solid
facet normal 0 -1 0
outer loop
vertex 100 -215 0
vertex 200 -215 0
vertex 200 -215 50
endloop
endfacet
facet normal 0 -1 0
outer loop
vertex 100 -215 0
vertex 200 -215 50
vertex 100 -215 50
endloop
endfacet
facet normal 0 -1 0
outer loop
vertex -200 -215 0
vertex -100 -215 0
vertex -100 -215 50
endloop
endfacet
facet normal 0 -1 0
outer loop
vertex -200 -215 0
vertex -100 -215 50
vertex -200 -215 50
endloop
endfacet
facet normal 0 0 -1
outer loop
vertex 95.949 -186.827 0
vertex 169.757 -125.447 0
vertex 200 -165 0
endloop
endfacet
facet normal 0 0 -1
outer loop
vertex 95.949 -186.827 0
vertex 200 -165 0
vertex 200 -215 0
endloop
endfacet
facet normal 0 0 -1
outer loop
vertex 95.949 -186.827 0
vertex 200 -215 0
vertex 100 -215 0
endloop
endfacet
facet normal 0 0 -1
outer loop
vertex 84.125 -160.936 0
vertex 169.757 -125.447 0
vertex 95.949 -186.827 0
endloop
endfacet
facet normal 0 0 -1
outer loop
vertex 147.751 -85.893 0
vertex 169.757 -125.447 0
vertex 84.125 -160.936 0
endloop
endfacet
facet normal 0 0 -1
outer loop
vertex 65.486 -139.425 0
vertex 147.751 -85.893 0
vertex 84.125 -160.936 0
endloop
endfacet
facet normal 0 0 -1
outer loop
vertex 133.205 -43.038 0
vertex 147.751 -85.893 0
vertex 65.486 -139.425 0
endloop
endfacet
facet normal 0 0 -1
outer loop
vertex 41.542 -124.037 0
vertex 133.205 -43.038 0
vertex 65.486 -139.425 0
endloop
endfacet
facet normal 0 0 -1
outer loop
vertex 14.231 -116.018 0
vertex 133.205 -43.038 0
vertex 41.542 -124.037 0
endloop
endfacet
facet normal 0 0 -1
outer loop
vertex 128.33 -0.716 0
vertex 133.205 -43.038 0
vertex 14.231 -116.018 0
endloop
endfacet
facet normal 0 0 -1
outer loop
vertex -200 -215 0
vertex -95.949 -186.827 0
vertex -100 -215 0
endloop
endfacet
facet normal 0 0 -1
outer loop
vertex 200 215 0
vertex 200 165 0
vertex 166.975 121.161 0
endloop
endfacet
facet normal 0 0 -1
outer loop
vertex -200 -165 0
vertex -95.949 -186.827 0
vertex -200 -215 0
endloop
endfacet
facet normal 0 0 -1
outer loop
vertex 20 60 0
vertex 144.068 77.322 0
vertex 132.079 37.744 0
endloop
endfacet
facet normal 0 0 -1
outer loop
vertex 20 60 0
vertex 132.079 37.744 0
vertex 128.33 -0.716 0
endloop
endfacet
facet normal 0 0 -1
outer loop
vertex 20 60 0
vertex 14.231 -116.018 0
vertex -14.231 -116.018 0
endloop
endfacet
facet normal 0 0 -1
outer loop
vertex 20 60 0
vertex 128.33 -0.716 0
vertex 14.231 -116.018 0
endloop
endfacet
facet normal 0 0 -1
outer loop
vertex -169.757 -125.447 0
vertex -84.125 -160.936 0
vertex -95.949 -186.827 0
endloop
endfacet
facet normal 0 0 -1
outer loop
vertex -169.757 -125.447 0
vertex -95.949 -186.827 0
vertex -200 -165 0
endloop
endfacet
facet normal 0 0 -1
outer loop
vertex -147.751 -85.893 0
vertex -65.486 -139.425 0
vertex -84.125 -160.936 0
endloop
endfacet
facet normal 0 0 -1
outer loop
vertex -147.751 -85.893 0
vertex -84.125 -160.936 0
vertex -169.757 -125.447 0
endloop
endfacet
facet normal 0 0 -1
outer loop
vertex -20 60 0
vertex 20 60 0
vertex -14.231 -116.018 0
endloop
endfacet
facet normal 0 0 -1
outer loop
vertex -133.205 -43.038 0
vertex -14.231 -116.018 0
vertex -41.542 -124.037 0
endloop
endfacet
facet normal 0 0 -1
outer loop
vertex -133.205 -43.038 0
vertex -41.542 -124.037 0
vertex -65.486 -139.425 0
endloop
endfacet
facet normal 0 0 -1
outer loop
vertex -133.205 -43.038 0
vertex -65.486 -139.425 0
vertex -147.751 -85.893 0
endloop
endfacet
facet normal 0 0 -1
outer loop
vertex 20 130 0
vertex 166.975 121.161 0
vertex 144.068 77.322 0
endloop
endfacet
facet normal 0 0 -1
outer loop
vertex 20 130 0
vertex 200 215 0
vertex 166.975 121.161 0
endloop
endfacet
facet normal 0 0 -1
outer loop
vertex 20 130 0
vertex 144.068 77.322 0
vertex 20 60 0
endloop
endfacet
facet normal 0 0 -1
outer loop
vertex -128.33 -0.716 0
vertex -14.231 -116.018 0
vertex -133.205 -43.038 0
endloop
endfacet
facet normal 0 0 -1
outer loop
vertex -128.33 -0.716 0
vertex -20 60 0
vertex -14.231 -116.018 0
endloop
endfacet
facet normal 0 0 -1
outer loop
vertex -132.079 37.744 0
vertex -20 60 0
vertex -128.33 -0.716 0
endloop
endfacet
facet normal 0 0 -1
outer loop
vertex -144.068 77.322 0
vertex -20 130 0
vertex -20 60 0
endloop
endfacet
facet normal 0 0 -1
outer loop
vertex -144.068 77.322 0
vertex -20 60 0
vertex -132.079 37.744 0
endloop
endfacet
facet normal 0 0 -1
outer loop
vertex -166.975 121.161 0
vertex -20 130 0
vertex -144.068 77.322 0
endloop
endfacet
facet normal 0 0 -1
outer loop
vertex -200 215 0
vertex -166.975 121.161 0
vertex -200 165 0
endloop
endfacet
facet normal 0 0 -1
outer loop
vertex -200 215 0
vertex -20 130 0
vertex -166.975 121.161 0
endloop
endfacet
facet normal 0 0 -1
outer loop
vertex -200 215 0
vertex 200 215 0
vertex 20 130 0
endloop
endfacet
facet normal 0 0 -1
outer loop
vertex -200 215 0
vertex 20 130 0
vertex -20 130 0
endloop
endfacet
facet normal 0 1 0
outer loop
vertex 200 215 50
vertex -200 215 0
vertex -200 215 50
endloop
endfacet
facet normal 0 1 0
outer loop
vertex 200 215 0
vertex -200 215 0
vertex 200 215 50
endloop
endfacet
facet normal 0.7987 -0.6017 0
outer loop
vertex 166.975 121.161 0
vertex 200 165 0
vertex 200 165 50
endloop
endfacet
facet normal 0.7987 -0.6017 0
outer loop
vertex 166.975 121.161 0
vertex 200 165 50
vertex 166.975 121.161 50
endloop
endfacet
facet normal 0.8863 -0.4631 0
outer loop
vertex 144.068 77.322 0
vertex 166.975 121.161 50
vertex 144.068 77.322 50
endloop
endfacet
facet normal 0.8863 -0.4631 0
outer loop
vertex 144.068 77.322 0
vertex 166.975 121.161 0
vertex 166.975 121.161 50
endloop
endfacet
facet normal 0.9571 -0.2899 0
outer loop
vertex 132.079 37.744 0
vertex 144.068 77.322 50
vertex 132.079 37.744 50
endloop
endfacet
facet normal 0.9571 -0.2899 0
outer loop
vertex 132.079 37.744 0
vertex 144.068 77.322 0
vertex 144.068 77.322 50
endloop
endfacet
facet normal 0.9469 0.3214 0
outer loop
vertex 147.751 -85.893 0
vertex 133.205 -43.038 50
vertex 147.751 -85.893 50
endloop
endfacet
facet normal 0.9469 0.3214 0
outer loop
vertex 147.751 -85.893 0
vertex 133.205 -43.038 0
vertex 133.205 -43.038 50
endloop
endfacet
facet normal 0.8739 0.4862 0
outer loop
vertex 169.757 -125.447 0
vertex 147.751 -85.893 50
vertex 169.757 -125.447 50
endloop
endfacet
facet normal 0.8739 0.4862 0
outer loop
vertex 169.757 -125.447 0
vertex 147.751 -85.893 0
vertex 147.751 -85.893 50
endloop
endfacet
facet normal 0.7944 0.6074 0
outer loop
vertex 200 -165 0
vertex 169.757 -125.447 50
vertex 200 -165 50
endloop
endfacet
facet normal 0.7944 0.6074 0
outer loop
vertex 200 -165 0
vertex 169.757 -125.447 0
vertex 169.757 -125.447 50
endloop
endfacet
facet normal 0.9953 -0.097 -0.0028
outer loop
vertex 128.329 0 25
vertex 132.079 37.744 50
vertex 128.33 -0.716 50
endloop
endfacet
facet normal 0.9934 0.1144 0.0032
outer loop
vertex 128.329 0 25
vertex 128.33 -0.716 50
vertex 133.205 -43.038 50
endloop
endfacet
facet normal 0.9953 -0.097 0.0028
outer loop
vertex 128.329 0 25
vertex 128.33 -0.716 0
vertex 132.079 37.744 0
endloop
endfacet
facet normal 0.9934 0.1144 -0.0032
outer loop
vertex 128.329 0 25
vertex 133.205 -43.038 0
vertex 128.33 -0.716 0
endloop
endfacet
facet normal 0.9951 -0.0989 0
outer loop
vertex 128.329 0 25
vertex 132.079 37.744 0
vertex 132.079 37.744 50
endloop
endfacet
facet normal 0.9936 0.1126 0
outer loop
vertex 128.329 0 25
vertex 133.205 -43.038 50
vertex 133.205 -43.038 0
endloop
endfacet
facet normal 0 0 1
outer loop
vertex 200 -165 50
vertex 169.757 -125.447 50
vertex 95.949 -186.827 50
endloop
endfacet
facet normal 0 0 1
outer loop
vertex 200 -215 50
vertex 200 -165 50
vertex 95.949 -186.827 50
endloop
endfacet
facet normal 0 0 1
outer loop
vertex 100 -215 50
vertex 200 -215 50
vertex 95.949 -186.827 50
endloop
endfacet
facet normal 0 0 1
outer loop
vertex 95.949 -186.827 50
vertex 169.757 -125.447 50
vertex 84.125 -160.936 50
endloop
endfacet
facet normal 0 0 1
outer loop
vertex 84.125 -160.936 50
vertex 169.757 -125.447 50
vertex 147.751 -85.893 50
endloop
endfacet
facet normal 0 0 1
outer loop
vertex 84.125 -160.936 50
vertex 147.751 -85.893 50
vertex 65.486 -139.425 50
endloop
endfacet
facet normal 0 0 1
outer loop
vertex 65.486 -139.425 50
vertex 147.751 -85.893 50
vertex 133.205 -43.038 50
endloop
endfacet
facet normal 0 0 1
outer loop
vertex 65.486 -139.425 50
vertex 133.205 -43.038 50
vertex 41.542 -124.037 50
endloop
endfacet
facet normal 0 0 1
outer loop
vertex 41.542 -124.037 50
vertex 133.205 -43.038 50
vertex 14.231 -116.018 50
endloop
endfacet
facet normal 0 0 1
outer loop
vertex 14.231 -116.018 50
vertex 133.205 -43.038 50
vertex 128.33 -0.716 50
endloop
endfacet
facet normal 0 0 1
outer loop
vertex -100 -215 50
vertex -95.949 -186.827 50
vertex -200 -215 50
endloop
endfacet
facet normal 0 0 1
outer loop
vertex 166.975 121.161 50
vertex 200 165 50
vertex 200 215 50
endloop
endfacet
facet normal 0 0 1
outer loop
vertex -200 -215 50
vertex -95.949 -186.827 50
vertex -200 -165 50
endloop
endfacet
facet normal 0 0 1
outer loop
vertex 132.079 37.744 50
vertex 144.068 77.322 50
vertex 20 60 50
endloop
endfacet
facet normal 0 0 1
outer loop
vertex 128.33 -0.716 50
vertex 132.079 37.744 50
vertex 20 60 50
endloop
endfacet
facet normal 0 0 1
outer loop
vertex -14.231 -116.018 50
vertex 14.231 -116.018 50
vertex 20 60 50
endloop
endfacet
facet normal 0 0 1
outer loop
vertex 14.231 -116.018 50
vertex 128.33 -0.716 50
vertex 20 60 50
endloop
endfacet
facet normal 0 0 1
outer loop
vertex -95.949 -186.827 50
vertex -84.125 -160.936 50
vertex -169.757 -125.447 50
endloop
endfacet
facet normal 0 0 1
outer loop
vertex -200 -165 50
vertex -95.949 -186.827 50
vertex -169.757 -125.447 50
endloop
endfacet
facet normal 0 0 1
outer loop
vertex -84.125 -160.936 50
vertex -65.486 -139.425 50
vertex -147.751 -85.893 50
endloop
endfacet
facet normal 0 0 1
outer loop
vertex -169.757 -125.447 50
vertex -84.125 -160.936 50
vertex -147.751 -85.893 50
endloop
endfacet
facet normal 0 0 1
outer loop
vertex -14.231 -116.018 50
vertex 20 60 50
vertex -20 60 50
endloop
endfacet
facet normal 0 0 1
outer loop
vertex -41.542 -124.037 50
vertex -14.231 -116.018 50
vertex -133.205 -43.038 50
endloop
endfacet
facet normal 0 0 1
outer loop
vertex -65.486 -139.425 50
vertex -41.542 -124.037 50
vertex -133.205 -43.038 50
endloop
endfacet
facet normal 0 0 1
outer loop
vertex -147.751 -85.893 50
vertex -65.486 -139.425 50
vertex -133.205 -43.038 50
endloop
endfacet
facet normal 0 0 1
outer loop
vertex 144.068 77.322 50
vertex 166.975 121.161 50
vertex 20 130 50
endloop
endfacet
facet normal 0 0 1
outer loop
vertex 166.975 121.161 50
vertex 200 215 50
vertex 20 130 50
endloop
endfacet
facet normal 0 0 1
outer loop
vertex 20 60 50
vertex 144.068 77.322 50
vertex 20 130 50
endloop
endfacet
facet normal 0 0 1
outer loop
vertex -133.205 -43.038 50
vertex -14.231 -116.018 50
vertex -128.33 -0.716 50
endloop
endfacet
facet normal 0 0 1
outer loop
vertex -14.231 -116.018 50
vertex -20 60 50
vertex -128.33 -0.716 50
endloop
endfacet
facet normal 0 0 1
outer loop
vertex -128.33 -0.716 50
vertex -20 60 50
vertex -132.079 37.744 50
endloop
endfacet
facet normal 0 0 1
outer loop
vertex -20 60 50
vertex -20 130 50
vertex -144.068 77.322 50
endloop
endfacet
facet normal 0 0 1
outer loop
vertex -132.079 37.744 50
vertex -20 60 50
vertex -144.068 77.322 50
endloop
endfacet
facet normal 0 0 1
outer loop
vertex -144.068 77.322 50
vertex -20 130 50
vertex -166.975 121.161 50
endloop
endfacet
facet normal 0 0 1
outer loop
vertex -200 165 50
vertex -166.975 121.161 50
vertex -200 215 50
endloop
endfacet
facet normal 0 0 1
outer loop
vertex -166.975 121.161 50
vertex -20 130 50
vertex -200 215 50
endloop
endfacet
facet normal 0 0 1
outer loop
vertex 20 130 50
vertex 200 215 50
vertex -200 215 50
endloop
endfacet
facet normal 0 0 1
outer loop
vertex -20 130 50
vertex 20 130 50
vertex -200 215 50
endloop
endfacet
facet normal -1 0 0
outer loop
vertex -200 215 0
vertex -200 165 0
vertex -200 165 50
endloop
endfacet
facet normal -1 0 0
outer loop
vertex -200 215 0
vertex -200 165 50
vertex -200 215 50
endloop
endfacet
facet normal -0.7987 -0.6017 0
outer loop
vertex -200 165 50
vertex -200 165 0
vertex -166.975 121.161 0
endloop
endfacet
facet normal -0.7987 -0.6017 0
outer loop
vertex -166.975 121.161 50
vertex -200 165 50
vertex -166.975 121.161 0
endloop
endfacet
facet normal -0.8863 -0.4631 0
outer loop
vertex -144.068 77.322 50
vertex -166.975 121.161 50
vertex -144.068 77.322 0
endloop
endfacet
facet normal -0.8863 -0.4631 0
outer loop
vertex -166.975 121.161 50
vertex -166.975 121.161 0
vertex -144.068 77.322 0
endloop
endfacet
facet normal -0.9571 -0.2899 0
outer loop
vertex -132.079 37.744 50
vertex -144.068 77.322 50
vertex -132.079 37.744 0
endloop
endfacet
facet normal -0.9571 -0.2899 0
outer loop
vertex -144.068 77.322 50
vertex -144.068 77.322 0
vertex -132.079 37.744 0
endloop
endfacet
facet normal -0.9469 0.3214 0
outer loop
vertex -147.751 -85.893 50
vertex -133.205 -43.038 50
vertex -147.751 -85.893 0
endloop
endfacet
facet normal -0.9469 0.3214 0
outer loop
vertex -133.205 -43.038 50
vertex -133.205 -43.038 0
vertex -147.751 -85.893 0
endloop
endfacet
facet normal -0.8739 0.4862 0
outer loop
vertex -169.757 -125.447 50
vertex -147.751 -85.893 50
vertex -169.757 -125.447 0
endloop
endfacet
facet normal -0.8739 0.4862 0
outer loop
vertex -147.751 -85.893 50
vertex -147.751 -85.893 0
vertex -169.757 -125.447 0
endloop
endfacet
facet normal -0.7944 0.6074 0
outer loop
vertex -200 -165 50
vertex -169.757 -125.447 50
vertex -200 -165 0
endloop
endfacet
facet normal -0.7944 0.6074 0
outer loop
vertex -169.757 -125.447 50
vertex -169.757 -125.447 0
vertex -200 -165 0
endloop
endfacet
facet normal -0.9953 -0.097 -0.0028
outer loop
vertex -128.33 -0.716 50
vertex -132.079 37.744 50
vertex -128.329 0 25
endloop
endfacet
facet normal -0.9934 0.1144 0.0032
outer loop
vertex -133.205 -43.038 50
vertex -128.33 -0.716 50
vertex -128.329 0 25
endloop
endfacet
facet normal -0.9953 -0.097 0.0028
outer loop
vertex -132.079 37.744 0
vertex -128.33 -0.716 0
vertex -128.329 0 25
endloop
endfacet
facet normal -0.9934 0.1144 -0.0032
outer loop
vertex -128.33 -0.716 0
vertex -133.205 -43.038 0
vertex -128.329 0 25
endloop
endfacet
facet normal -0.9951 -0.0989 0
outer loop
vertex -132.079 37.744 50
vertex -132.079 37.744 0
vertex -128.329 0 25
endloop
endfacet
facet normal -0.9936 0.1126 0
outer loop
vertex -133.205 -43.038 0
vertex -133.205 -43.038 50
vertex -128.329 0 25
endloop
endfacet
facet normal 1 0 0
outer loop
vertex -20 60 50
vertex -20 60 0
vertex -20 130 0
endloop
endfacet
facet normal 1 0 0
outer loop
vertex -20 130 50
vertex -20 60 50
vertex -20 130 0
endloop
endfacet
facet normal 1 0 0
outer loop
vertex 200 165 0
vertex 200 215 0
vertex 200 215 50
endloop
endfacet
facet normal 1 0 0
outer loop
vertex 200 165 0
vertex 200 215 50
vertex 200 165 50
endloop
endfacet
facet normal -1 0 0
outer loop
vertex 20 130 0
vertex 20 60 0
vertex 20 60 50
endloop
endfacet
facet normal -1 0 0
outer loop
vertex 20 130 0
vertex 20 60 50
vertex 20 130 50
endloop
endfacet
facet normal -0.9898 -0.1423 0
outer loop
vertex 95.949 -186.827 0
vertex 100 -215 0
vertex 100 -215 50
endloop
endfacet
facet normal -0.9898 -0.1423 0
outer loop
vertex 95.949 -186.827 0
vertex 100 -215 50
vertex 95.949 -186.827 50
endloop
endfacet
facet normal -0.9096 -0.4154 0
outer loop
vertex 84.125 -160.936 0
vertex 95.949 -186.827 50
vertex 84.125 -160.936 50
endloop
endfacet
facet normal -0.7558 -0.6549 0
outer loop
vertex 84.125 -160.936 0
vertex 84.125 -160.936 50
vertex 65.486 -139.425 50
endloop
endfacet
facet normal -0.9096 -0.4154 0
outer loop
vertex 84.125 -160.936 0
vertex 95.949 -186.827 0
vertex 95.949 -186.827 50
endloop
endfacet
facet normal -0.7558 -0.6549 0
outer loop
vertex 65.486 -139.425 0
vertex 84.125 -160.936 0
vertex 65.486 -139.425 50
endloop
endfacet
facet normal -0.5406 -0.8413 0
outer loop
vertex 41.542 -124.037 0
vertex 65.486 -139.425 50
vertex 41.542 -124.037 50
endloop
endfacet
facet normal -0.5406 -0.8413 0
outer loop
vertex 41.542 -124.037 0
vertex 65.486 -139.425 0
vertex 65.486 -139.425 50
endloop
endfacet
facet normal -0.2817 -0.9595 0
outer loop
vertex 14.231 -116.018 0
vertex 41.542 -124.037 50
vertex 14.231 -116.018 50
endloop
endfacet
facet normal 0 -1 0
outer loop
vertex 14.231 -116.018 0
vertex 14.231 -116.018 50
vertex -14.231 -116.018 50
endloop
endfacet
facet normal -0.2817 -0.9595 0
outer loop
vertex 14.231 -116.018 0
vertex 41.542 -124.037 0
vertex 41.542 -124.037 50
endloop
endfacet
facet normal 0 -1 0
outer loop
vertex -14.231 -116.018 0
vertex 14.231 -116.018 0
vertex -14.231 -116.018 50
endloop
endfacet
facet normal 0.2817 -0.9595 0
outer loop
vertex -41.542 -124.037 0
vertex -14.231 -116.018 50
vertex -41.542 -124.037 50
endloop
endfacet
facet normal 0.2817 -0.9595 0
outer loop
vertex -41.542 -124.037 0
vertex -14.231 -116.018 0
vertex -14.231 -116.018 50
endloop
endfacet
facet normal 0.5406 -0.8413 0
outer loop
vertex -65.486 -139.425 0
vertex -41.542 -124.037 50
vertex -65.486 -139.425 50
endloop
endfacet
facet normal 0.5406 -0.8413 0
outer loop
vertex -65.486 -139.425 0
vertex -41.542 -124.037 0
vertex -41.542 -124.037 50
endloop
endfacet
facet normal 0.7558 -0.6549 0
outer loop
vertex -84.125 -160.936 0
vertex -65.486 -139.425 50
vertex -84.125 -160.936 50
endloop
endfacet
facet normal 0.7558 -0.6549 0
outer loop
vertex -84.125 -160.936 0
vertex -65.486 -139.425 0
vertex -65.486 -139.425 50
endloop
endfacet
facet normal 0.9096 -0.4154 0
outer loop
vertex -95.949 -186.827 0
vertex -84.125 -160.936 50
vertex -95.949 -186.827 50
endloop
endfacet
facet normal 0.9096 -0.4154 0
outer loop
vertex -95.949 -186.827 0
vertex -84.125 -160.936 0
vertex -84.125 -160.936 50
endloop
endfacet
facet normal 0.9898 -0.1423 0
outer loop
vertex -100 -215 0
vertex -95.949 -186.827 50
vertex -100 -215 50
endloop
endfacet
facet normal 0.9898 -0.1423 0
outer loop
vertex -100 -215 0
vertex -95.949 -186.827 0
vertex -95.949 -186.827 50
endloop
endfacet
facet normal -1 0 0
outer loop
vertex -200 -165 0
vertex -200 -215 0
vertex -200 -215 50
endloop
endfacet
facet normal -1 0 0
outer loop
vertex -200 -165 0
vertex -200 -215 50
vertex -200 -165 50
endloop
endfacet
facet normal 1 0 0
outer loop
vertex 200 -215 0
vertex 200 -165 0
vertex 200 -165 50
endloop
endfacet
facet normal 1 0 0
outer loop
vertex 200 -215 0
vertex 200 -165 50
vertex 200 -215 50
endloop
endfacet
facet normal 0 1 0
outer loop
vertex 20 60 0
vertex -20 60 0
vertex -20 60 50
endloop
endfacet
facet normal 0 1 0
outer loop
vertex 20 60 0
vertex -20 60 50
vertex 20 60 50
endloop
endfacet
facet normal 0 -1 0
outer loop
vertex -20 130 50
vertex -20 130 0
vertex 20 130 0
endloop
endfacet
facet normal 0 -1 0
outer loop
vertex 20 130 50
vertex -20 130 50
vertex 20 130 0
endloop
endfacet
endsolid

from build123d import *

# Parameters (mm, degrees)
SKETCH_1_W      = 40
SKETCH_1_H      = 70
EXTRUDE_3_DEPTH = 50


with BuildPart() as part:
    # Эскиз1 → Бобышка-Вытянуть3 (new body)
    with BuildSketch(Plane.XY):
        with BuildLine():
            Line((-100, -215), (-200, -215))
            Line((-200, -215), (-200, -165))
            add(Edge.make_bspline(
                [(-200, 165), (-56.658015908, 0), (-200, -165)],
                knots=[0, 0, 0, 1, 1, 1], degree=2))
            Line((-200, 165), (-200, 215))
            Line((-200, 215), (0, 215))
            Line((0, 215), (200, 215))
            Line((200, 215), (200, 165))
            add(Edge.make_bspline(
                [(200, 165), (56.658015908, 0), (200, -165)],
                knots=[0, 0, 0, 1, 1, 1], degree=2))
            Line((200, -165), (200, -215))
            Line((200, -215), (100, -215))
            ThreePointArc((100, -215), (0, -115), (-100, -215))
        make_face()
        with Locations((0, 95)):
            Rectangle(SKETCH_1_W, SKETCH_1_H, mode=Mode.SUBTRACT)
    extrude(amount=EXTRUDE_3_DEPTH)


solid = part.part
